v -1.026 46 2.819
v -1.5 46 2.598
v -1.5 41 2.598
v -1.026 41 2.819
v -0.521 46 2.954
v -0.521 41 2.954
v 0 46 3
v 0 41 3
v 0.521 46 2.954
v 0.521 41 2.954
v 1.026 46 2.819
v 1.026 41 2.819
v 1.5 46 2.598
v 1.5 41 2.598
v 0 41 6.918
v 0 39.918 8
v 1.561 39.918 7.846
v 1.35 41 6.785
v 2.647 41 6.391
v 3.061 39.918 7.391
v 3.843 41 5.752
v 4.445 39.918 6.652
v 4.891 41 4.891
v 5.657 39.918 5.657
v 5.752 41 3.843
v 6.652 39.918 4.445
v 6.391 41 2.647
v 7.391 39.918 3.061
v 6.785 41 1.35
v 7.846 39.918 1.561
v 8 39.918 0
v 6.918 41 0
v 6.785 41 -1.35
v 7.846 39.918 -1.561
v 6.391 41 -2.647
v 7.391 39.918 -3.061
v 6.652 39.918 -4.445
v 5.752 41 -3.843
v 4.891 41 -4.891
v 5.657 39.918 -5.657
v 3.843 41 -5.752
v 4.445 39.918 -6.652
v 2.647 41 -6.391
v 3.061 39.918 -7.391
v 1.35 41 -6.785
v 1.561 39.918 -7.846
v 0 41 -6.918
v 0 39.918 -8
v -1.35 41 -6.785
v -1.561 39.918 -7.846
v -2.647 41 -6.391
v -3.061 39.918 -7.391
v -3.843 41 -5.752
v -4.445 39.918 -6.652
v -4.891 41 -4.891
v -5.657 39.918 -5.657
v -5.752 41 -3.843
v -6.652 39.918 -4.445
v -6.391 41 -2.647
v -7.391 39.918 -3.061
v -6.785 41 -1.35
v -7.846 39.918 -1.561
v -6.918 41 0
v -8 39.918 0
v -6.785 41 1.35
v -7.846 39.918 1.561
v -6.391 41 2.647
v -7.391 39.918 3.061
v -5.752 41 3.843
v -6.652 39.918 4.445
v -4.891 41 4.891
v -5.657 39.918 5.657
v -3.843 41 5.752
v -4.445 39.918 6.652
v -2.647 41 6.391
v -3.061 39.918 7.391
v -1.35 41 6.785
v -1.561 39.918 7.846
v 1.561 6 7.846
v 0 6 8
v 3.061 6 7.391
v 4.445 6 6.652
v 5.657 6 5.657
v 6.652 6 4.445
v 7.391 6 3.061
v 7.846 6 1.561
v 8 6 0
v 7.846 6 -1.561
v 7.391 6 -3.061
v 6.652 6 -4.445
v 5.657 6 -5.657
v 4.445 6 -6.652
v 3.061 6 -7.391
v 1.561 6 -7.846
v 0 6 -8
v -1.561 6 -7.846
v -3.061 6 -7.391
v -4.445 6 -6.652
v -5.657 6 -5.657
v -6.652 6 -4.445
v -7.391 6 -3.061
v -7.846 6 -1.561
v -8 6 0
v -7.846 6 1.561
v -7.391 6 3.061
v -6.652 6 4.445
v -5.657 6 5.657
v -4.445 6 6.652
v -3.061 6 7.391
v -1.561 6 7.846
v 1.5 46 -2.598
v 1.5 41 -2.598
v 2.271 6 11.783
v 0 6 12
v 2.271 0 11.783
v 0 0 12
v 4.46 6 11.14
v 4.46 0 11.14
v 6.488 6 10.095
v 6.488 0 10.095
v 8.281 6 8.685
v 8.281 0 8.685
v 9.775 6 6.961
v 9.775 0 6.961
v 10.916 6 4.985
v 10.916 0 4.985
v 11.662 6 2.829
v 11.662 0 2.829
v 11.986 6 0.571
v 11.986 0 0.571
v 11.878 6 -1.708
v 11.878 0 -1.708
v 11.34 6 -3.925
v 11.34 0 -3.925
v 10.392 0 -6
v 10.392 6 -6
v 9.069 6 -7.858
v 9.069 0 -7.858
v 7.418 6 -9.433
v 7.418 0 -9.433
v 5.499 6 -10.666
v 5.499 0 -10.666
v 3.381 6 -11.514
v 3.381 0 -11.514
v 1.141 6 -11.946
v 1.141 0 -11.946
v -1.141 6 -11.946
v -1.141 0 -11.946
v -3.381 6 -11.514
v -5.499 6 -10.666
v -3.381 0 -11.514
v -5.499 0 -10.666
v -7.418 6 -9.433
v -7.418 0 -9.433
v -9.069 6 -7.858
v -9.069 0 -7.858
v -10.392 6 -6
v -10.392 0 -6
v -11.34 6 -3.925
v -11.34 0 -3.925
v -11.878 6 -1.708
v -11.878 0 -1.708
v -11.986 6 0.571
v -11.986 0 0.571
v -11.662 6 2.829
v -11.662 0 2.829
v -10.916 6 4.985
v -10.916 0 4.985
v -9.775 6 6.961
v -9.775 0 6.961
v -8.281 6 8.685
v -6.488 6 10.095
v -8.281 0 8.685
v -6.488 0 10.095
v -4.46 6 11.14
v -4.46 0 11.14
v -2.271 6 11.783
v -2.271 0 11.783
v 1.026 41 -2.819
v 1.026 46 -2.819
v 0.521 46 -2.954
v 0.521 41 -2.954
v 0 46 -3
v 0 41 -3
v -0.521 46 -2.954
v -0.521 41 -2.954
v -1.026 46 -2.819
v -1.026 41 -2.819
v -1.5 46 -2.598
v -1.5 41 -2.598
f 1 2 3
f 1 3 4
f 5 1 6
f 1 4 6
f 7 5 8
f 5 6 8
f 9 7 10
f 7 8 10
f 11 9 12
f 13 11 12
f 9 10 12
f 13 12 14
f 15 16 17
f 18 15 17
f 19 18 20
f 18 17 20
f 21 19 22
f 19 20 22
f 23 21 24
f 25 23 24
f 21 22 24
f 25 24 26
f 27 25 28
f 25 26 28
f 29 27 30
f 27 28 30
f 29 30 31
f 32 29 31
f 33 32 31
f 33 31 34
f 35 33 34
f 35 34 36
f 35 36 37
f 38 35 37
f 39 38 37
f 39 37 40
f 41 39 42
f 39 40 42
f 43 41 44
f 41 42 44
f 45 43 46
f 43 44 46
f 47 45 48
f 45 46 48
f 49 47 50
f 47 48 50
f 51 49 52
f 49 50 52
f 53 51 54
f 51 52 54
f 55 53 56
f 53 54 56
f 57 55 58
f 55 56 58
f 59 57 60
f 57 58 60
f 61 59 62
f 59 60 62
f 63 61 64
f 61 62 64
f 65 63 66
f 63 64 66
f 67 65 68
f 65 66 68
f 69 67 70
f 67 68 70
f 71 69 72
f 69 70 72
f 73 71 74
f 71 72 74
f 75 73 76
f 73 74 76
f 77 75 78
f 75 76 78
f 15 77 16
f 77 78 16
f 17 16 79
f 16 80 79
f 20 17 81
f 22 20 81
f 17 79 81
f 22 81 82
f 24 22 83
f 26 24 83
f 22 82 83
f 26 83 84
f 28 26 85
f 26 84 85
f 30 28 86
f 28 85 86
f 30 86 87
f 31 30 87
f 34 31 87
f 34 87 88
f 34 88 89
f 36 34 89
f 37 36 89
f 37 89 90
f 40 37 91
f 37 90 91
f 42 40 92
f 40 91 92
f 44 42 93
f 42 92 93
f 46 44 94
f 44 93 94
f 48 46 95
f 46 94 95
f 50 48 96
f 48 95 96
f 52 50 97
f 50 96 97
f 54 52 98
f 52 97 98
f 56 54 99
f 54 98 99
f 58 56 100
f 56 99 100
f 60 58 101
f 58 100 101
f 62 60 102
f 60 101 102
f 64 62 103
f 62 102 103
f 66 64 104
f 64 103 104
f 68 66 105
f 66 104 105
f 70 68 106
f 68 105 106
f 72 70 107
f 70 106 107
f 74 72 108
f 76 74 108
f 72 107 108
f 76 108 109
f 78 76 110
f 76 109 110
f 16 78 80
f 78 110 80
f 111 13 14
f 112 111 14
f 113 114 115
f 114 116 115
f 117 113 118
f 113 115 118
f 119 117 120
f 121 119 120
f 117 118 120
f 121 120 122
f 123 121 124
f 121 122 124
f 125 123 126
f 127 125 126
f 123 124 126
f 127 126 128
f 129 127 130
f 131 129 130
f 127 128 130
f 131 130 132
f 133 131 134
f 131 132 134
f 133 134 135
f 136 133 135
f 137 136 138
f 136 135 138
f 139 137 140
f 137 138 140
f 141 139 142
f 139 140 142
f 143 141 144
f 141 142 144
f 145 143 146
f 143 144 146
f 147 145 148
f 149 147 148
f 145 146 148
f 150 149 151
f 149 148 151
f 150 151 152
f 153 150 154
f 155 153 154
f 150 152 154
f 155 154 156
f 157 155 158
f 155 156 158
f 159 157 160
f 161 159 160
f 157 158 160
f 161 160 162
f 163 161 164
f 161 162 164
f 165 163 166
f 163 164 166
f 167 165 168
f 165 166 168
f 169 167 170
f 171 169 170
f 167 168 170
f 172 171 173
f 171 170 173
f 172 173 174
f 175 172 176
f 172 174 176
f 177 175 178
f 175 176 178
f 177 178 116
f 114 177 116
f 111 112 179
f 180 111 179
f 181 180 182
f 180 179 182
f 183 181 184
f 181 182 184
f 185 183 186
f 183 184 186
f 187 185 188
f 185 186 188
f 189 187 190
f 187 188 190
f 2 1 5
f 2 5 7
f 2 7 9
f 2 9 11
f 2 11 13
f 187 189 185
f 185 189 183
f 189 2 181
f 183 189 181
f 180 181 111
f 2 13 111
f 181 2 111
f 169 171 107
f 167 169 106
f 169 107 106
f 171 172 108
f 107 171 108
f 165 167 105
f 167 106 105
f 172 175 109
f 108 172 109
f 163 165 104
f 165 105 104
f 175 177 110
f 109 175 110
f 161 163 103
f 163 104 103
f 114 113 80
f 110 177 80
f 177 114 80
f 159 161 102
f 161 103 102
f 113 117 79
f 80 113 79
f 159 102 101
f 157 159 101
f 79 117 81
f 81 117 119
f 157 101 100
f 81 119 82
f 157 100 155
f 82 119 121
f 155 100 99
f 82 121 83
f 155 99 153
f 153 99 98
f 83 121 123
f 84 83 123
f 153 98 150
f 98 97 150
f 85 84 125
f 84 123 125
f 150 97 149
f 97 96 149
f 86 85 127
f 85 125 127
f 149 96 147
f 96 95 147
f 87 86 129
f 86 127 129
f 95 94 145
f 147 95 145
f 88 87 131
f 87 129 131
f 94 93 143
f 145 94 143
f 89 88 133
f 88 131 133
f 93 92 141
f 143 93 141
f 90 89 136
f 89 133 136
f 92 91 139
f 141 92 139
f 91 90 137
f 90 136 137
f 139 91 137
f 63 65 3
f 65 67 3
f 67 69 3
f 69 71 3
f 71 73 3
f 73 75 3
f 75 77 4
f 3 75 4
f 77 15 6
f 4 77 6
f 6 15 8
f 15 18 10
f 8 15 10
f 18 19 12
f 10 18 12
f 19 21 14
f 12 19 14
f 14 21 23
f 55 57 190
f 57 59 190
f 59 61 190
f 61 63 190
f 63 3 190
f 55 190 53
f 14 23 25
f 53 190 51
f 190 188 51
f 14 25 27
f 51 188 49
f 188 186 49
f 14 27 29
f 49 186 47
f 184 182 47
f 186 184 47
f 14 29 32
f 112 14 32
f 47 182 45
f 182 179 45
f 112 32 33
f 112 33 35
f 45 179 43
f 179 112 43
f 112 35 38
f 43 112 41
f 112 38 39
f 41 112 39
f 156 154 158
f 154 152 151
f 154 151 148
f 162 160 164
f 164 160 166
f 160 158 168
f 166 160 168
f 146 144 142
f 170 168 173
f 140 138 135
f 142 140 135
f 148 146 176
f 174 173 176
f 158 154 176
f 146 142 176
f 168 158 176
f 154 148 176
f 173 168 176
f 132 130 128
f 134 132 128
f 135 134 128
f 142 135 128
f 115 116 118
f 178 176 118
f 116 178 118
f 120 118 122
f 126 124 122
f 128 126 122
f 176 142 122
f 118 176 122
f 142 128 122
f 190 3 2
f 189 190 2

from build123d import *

# Parameters (mm, degrees)
CUT_EXTRUDE_1_DEPTH      = 16
CUT_EXTRUDE_1_DEPTH_BACK = 16


with BuildPart() as part:
    # 草图1 → 旋转1 (revolve)
    with BuildSketch(Plane.XY):
        Polygon((0, 46), (3, 46), (3, 41), (6.9175, 41), (8, 39.9175), (8, 6), (12, 6), (12, 0), (0, 0), align=None)
    revolve(axis=Axis((0, 0, 0), (0, 1, 0)))

    # 草图2 → 切除-拉伸1 (cut, two sides: drawn at the far end of the back side and taken through both)
    with BuildSketch(Plane.XY.offset(-CUT_EXTRUDE_1_DEPTH_BACK)):
        Polygon((-3, 41), (-1.5, 41), (-1.5, 46), (1.5, 46), (1.5, 41), (3, 41), (3, 49), (-3, 49), align=None)
    extrude(amount=CUT_EXTRUDE_1_DEPTH + CUT_EXTRUDE_1_DEPTH_BACK, mode=Mode.SUBTRACT)


solid = part.part
